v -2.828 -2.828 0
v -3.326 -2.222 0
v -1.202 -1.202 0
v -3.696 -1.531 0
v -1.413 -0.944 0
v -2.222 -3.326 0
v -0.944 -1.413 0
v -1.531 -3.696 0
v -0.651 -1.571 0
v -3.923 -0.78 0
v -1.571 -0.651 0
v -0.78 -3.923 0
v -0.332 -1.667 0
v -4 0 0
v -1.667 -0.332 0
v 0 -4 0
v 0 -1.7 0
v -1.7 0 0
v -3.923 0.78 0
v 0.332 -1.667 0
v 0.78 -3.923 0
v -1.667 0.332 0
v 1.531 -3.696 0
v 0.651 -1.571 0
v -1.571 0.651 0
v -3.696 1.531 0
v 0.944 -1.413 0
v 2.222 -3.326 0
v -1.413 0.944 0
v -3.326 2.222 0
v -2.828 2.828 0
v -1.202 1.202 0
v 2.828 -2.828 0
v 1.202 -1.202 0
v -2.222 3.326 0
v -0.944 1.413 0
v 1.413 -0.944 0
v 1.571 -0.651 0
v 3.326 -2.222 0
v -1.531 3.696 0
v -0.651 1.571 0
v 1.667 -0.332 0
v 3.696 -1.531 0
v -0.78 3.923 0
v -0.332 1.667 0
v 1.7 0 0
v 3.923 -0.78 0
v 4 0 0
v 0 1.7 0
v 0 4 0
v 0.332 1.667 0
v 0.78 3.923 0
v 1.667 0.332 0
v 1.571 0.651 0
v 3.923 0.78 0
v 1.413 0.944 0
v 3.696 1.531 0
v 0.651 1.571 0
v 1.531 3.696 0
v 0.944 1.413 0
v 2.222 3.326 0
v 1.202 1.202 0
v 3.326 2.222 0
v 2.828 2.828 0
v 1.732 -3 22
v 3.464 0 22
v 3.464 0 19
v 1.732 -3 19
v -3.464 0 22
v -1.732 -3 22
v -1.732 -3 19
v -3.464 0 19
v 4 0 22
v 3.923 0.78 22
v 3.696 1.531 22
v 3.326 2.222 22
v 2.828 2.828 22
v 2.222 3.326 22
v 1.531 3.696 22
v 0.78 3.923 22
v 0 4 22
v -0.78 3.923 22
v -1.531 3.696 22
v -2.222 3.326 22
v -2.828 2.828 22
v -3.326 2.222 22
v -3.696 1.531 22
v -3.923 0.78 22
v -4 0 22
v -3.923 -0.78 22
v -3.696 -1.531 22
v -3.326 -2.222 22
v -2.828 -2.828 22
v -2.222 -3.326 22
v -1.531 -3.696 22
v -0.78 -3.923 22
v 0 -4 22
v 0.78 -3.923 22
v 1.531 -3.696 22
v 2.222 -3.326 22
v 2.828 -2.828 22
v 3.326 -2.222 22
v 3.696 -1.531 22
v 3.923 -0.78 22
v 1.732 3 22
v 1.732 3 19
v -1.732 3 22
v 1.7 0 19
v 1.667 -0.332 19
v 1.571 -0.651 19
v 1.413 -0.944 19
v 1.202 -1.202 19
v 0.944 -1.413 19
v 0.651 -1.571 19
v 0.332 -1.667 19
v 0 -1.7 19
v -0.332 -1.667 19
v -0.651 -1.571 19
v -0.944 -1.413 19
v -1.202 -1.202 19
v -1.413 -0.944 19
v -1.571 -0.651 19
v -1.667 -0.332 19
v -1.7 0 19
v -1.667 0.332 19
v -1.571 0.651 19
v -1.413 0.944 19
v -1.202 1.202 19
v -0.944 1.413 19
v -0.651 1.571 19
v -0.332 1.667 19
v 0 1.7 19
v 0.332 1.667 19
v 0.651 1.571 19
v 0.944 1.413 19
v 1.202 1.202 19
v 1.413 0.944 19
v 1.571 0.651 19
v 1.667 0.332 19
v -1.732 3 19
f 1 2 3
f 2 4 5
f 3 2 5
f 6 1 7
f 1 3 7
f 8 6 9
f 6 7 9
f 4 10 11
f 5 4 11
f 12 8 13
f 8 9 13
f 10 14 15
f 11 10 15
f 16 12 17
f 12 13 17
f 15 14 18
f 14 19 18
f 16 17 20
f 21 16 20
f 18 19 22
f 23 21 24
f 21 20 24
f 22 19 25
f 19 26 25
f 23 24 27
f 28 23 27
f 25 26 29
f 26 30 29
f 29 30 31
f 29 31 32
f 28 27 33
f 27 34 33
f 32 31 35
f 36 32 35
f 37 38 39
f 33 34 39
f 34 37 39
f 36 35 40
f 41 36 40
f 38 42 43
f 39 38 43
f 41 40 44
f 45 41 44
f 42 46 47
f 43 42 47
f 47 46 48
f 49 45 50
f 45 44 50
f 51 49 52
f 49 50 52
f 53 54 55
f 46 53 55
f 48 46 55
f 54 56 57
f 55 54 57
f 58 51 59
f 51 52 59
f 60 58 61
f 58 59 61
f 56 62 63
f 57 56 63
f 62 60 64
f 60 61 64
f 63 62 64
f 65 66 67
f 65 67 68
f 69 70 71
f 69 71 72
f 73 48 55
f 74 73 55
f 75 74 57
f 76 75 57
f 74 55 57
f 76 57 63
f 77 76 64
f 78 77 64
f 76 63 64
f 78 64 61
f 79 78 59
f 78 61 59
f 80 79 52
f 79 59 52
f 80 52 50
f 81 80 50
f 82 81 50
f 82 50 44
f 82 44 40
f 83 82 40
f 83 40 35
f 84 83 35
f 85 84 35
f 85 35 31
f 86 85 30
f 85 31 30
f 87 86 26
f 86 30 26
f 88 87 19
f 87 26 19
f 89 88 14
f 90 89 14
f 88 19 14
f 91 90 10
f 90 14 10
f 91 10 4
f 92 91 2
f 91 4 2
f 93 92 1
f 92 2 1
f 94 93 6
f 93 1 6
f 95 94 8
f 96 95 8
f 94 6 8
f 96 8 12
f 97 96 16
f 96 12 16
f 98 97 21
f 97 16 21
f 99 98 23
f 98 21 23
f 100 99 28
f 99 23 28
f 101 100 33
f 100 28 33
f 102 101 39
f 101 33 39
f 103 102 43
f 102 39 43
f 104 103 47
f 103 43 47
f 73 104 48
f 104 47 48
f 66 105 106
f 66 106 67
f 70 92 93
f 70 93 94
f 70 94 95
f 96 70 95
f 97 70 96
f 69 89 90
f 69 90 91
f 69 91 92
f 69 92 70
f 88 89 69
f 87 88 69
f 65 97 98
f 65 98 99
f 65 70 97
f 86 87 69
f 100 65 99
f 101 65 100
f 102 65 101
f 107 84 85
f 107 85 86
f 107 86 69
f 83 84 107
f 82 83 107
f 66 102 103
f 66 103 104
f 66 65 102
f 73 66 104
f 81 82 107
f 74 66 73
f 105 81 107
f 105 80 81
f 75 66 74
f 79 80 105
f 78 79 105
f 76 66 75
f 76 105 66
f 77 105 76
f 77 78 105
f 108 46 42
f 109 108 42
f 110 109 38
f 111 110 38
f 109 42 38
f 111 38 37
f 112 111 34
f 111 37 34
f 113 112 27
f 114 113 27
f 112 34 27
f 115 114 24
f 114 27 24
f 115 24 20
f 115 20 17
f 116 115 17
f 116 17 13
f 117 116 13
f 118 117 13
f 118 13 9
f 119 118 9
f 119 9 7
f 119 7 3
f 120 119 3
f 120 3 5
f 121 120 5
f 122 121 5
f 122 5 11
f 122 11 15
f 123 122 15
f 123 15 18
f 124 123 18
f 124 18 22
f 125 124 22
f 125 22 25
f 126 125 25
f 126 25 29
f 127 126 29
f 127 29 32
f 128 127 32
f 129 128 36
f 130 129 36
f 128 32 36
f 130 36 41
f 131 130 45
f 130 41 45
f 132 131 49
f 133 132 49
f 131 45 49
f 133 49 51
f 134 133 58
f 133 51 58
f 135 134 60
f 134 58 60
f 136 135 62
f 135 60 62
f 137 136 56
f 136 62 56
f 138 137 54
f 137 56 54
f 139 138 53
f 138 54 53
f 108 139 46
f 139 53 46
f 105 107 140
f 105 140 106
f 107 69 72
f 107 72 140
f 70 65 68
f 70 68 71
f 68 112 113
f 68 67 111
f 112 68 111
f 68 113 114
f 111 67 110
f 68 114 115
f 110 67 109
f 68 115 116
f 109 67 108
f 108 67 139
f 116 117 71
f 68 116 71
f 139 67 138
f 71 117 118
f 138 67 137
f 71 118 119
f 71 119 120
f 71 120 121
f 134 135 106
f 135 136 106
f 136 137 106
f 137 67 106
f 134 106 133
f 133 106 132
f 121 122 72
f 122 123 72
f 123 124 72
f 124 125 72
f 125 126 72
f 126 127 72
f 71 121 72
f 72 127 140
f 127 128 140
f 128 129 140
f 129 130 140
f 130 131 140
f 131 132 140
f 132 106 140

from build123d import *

# Parameters (mm, degrees)
SKETCH001_R     = 4
PAD001_DEPTH    = 22
POCKET_DEPTH    = 3
SKETCH002_R     = 1.7
POCKET001_DEPTH = 30


with BuildPart() as part:
    # Sketch001 → Pad001 (new body)
    with BuildSketch(Plane.XY):
        Circle(SKETCH001_R)
    extrude(amount=PAD001_DEPTH)

    # Sketch → Pocket (cut)
    with BuildSketch(Plane.XY.offset(22)):
        Polygon((-1.732051, 3), (1.732051, 3), (3.464102, 0), (1.732051, -3), (-1.732051, -3), (-3.464102, 0), align=None)
    extrude(amount=-POCKET_DEPTH, mode=Mode.SUBTRACT)

    # Sketch002 → Pocket001 (cut)
    with BuildSketch(Plane(origin=(0, 0, 0), x_dir=(1, 0, 0), z_dir=(0, 0, -1))):
        Circle(SKETCH002_R)
    extrude(amount=-POCKET001_DEPTH, mode=Mode.SUBTRACT)


solid = part.part
